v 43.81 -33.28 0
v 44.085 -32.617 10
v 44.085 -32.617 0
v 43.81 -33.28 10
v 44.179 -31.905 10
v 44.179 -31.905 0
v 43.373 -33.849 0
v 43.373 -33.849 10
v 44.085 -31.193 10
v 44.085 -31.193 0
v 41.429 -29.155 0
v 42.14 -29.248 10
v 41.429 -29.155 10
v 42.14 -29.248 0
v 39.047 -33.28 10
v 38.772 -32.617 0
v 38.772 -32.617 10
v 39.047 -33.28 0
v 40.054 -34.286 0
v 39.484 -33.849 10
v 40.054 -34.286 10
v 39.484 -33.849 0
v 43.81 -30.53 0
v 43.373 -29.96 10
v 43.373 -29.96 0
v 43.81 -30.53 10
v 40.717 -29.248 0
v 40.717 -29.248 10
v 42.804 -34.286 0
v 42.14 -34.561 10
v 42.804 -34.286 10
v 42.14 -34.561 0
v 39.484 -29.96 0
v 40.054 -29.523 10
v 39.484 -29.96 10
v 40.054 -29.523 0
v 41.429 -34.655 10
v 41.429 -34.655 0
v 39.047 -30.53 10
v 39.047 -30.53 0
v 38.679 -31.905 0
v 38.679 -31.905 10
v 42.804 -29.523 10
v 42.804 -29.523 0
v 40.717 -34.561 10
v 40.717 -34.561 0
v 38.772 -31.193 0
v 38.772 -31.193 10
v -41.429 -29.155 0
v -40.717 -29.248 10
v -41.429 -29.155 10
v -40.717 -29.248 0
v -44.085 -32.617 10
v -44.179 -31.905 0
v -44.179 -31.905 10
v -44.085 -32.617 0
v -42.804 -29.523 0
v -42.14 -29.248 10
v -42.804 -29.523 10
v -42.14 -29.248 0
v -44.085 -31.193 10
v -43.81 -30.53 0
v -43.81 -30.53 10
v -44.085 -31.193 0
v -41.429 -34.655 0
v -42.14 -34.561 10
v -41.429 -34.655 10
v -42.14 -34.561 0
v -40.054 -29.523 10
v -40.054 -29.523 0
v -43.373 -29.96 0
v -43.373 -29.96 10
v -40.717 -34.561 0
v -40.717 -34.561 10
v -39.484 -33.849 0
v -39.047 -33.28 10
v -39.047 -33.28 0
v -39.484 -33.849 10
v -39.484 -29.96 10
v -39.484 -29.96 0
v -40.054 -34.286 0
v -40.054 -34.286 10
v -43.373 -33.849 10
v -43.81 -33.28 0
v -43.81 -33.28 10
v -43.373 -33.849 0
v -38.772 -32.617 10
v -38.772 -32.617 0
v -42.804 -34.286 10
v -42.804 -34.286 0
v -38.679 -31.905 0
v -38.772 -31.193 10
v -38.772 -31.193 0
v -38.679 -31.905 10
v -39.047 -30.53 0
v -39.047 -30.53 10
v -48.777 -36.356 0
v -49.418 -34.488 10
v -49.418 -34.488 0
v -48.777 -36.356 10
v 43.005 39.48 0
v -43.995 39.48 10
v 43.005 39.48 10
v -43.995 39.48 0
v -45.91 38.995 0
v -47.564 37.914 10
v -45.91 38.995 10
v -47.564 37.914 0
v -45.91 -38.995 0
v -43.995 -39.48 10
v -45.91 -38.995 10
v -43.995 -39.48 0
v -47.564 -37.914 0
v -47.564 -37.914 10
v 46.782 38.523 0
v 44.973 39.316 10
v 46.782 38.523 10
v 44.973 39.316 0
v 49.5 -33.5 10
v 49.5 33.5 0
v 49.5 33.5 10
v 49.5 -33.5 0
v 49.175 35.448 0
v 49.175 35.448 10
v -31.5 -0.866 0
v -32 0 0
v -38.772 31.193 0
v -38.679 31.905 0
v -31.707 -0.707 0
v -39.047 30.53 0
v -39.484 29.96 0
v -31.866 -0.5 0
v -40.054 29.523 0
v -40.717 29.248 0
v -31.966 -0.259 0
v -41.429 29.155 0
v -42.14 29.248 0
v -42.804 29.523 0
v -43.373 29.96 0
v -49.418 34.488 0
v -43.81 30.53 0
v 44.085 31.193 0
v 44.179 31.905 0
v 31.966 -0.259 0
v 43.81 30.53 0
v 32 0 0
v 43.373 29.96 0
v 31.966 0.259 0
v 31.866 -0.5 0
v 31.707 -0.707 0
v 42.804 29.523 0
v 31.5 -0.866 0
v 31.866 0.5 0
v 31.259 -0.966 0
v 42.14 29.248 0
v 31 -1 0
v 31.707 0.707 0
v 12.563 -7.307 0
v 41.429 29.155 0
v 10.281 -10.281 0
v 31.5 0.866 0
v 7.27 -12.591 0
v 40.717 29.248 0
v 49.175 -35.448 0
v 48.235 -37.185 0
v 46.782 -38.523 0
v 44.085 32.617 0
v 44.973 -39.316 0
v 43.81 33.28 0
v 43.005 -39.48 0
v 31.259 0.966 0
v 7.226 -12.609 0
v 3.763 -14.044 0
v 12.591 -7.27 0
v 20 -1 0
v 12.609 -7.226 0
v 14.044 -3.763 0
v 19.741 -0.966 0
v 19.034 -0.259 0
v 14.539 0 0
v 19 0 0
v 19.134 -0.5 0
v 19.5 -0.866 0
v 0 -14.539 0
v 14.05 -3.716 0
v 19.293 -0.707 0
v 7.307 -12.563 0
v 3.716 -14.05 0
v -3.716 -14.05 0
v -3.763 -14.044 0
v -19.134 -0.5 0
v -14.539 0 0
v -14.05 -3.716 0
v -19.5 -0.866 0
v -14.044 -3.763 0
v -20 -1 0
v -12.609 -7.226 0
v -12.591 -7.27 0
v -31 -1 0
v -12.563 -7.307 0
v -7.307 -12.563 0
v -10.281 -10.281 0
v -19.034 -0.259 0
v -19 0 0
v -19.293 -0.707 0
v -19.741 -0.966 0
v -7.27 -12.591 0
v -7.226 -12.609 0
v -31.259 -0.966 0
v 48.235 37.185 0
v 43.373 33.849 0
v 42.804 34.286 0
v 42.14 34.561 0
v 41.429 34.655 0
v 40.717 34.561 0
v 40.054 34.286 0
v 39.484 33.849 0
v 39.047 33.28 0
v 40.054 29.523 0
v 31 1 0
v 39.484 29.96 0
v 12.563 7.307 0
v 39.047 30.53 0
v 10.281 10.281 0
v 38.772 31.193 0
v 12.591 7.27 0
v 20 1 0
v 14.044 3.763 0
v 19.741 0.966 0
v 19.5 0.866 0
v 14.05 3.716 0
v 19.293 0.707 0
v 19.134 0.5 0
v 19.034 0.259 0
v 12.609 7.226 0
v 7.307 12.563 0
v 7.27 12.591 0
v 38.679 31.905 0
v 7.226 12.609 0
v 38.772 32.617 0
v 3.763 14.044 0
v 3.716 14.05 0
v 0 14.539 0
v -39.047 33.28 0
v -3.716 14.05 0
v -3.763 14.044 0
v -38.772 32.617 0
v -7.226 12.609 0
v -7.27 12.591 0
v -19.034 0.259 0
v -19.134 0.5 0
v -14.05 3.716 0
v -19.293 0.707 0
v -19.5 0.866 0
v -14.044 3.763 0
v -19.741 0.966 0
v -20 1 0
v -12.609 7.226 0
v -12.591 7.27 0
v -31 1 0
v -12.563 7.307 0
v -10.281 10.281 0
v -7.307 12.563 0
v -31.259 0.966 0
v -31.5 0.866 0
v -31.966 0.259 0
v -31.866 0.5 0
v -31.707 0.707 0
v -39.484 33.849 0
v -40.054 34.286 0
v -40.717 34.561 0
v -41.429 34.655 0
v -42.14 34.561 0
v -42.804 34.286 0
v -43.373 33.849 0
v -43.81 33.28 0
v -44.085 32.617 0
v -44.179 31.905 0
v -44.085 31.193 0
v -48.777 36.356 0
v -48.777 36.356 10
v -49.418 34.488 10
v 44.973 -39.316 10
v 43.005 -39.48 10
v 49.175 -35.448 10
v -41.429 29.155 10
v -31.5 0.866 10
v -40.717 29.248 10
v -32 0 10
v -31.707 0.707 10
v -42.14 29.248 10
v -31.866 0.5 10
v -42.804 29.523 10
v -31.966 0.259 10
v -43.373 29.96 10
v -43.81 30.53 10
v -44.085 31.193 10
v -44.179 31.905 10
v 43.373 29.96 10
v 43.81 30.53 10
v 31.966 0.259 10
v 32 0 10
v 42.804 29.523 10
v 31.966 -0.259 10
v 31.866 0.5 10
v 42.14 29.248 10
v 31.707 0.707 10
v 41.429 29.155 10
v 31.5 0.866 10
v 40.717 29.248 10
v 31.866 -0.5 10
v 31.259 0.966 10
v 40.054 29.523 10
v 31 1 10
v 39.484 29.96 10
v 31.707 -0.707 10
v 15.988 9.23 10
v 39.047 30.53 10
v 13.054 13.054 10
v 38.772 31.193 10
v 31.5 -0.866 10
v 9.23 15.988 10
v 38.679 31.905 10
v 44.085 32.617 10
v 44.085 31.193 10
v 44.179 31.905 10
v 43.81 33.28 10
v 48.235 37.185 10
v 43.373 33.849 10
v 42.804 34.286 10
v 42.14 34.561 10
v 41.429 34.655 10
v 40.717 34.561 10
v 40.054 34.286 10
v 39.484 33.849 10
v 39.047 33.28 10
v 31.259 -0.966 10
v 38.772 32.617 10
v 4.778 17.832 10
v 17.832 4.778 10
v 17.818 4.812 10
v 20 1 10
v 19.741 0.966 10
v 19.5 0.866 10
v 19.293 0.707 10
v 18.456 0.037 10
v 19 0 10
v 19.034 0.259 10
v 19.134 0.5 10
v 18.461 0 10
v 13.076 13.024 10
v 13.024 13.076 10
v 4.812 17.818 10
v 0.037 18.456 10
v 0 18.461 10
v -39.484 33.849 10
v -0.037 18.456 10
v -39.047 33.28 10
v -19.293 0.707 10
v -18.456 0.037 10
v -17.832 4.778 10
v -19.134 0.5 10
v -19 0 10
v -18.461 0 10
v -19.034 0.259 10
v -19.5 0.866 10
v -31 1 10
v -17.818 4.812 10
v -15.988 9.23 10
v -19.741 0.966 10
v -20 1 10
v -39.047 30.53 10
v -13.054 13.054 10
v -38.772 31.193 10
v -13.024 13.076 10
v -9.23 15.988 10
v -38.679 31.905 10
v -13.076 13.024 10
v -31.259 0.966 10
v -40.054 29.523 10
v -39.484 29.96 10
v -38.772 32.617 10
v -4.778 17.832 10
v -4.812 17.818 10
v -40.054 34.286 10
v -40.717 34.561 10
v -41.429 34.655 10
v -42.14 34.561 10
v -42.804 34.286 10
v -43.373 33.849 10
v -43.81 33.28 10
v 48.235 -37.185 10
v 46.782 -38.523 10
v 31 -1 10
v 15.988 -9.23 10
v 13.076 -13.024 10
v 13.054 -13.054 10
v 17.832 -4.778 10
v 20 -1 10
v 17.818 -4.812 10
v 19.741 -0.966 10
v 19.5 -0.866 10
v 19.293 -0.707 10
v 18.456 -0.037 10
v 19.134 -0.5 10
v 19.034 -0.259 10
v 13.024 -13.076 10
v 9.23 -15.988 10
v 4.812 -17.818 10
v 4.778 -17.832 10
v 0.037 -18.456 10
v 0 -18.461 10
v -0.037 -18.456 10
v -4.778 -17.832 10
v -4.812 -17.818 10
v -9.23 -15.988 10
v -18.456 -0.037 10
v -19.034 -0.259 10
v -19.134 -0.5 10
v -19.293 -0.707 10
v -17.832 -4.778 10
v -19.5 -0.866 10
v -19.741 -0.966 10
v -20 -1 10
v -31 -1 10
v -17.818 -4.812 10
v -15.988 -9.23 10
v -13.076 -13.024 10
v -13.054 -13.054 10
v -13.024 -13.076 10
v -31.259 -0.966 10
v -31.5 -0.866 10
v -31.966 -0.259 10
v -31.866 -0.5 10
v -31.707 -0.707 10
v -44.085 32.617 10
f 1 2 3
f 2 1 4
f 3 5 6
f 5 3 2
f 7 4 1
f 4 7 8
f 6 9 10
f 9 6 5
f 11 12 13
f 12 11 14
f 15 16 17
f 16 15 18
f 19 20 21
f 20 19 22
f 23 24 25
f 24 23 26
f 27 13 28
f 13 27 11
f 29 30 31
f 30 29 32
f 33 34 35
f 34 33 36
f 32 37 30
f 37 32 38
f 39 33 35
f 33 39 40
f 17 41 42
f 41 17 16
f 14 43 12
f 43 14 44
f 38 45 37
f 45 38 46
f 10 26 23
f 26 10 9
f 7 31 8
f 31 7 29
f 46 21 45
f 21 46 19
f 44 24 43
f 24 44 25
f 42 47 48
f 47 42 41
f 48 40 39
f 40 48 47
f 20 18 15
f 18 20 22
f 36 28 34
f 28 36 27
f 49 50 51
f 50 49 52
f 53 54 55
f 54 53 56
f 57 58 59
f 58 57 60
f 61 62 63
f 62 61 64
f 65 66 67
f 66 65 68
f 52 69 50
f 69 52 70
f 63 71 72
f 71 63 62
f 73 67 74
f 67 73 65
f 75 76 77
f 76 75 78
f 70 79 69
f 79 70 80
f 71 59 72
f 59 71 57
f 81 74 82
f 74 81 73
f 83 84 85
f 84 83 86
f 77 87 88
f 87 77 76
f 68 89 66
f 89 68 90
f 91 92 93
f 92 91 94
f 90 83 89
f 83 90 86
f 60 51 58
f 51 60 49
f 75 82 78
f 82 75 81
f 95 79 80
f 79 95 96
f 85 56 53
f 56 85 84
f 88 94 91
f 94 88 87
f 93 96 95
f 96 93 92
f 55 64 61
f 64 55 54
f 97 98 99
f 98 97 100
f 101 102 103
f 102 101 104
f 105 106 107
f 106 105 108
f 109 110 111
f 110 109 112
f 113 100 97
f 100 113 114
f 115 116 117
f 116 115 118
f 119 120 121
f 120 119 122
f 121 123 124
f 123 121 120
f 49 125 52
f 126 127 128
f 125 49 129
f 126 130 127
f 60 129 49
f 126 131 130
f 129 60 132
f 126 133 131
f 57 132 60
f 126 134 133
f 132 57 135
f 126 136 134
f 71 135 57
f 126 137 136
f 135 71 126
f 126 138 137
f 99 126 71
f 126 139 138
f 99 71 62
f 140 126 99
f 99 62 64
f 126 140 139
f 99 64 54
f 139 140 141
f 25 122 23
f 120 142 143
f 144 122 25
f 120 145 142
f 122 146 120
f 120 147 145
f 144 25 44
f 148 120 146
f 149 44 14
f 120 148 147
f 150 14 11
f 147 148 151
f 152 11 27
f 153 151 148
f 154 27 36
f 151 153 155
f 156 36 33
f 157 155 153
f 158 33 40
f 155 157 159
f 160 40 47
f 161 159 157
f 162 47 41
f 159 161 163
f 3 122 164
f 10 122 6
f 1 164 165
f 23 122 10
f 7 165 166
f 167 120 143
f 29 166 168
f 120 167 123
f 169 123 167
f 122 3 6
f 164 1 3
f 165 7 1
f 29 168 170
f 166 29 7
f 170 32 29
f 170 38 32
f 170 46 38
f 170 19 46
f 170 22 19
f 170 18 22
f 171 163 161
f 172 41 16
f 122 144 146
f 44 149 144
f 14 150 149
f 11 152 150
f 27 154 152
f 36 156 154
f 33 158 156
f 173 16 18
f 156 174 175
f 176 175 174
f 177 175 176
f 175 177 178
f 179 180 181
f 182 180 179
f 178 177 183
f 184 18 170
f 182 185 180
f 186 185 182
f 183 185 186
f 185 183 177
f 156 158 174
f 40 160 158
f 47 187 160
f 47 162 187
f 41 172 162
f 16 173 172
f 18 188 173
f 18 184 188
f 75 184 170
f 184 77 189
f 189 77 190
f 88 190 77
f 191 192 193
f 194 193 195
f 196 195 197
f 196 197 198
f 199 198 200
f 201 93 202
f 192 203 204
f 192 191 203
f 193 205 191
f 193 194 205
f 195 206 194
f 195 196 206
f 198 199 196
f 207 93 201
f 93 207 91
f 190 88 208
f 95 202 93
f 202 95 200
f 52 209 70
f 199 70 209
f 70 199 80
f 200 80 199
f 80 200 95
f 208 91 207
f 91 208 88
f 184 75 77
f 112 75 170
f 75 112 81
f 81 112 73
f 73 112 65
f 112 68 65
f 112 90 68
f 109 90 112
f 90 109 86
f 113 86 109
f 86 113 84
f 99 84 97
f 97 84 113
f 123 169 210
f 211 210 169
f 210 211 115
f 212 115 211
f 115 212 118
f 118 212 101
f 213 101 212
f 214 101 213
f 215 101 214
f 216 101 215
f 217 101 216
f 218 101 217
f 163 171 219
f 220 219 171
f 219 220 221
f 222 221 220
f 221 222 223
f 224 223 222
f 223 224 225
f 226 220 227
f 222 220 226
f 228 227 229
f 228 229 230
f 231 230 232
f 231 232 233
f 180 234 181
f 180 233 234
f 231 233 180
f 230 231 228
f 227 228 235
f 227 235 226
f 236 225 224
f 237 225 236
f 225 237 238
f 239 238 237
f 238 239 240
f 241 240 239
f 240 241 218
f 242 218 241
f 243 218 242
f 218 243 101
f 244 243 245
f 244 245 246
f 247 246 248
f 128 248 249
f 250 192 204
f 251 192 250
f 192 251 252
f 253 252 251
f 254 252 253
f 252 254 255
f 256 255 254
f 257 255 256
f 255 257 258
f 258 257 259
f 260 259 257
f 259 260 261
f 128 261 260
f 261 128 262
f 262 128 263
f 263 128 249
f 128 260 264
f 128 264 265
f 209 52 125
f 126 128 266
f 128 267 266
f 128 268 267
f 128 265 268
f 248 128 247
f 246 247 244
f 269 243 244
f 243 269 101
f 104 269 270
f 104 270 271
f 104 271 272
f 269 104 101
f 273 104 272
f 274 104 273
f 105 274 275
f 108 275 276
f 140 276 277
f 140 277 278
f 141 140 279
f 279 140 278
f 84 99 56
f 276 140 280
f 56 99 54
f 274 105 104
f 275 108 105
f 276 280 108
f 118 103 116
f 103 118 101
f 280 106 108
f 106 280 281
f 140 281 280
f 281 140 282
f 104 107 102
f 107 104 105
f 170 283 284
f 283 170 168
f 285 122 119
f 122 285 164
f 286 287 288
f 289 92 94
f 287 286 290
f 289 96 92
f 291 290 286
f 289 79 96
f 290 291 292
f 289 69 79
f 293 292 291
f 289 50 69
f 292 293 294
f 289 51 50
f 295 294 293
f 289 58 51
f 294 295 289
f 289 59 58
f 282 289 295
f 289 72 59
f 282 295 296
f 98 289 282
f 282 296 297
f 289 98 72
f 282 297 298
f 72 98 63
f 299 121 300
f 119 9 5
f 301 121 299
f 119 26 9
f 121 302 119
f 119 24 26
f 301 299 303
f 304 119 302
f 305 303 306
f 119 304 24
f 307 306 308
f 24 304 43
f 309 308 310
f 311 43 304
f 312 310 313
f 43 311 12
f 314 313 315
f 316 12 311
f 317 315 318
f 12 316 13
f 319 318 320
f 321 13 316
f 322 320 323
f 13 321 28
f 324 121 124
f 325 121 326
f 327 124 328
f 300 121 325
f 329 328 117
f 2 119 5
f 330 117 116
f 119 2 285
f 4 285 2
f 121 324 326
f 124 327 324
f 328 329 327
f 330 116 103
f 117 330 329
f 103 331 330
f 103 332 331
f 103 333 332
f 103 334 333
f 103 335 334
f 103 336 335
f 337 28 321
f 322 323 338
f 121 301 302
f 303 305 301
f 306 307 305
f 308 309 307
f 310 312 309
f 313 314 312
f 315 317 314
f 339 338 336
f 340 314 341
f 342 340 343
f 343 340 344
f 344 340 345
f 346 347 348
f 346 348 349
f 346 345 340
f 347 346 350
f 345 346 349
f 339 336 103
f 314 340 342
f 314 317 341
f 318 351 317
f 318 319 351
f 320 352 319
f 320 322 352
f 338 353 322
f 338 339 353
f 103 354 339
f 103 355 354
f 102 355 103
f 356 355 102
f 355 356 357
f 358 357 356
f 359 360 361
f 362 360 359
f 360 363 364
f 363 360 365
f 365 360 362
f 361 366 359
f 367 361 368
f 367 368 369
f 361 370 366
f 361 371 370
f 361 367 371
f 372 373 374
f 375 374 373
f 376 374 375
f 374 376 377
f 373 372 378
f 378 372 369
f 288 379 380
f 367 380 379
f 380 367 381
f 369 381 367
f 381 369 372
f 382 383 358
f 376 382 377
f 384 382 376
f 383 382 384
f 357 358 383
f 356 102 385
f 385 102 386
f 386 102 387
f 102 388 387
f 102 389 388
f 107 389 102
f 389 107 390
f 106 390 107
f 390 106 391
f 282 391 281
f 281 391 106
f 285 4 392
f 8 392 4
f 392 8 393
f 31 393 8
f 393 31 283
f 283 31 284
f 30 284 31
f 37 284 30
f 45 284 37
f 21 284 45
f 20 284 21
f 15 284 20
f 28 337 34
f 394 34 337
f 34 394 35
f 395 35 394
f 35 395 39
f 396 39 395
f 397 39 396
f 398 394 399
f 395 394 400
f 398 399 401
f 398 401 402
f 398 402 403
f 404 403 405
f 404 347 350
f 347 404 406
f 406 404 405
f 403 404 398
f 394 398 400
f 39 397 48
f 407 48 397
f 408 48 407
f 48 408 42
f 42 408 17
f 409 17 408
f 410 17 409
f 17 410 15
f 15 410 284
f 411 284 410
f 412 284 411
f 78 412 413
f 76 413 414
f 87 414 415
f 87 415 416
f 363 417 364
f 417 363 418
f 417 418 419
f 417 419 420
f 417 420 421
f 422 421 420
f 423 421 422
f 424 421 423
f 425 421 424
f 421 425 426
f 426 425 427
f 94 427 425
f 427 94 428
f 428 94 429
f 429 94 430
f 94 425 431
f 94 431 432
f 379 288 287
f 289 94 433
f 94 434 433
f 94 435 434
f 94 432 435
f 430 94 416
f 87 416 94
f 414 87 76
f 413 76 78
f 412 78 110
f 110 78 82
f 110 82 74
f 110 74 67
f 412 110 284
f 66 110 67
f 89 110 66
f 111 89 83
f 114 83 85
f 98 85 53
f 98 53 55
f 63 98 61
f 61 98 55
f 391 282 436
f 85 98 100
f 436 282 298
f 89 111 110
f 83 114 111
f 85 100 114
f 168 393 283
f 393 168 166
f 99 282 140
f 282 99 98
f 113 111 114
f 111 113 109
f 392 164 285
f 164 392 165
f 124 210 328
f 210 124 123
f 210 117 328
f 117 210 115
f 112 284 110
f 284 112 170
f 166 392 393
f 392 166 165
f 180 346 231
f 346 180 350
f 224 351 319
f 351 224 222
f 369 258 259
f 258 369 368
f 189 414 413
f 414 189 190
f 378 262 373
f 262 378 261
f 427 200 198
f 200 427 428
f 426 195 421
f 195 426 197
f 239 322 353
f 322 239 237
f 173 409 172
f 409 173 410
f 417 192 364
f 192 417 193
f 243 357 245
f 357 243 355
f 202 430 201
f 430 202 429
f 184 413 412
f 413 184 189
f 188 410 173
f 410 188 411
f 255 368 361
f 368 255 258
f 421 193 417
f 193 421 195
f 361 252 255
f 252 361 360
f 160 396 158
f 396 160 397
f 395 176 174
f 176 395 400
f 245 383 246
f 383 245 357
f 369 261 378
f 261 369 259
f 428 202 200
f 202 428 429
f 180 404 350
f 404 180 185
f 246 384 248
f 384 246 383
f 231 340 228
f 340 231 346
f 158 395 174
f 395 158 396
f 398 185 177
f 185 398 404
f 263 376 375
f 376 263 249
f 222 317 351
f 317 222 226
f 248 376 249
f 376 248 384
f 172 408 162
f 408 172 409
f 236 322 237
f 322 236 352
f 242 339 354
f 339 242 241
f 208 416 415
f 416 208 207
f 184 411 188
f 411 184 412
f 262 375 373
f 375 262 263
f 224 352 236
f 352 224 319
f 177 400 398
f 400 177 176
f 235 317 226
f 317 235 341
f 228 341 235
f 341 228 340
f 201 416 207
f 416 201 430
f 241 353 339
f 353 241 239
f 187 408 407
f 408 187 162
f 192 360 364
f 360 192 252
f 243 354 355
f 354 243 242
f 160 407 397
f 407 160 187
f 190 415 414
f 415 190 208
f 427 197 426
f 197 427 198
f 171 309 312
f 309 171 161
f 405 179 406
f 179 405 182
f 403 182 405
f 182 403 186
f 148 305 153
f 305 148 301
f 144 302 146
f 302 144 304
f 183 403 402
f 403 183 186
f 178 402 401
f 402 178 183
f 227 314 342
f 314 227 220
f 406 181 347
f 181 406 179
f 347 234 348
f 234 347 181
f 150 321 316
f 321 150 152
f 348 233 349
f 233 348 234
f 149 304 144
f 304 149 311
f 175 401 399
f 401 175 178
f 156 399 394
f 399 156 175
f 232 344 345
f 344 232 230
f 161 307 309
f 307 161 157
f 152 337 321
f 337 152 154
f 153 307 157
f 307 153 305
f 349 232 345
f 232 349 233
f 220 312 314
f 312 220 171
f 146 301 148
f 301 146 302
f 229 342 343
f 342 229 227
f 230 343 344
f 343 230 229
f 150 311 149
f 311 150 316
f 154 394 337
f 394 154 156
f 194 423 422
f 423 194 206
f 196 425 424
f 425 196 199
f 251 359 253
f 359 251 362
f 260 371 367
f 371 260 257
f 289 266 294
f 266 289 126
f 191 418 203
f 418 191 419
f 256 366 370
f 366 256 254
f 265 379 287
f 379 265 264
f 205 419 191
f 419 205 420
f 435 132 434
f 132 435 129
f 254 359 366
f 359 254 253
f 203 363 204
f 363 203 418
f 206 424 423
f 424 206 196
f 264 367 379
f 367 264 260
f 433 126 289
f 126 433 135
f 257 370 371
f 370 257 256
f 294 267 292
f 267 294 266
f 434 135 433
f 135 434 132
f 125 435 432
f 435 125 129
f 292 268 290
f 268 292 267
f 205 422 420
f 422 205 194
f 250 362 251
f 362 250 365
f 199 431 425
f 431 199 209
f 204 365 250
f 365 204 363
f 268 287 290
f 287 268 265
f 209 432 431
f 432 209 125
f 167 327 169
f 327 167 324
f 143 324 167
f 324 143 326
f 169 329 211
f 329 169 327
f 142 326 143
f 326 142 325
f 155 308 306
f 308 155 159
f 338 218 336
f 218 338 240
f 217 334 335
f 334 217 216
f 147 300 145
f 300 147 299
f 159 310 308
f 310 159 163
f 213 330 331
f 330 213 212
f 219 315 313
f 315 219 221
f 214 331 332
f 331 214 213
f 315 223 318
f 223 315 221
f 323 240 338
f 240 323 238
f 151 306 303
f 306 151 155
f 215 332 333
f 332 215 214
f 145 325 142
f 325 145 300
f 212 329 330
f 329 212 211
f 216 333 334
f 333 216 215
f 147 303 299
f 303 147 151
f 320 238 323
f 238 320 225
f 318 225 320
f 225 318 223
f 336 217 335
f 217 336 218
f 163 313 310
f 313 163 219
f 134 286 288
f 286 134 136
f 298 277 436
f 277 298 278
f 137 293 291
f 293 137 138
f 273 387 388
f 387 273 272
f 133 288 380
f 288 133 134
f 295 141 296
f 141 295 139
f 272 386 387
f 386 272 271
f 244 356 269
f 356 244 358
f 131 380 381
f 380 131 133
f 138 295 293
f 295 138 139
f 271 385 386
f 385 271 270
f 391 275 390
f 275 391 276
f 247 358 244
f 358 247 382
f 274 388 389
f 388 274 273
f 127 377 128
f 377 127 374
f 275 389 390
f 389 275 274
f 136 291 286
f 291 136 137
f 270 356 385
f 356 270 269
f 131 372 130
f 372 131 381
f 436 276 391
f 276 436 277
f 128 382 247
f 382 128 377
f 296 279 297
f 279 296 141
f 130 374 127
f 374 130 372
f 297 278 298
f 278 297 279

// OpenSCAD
// Sillcock Mount and Repair Frame --  Version 1.0
// (C) 2016 by Matthew Nielsen
// Home page: https://github.com/xunker/sillcock_mount_repair
// License: "Creative Commons -- Attribution -- Non-Commercial -- Share Alike"

// Thickness of the spacer. The default of 10mm is about 3/8th inch.
thickness = 10.0;

// Diameter of the main pipe opening. NOTE: since this spacer slides length-wise down the pipe, this opening must be big enough to pass anything else on the pipe like the integrated nut. The default of 29mm gives clearance for a 26mm pipe, the integrated nut.
pipe_diameter = 29.0;

// Many sillcocks have welds around the flange. Set a opening taper to make the pipe opening be a cone so the spacer can go around the welds and set flush with the flange. If
opening_taper_diameter = 37.0;

// Diameter of the mounting screw holes around the corners
mount_screw_hole_diameter = 5.5;

// Postion of the mounting screw holes in the corner as a ratio of the width and height. Larger numbers will place them closer to the center.
mount_screw_position_ratio = 2.1;

// Diameter of the screw channels on either side of the opening. This is where the sillcock will attach to the frame and so it should be kept small to give your screws more "bite".
screw_channel_diameter = 2.0;

// The beginning offset of the screw channel *from the center of the object*.
screw_x_offset = 20.0;

// To create an elongated screw screw channel (recommended), use this to specify how wide it will be.
screw_x_width = 11.0;

// Length of the spacer. You should not need to change this.
length = 67.0;

// Width of the spacer. You should not need to change this.
width = 87.0;

// Rounder corner radius. This will be added to the width and height of the plate.
rounded_corner_radius = 6;

// Facets: Increasing this will make for smoother circles but will also increase the rendering time. You should not need to change this.
facets = 24;

module screw_channel() {
  hull() {
    translate([screw_x_offset, 0, -0.1]) cylinder(d=screw_channel_diameter, h=thickness+0.2, $fn=facets);
    translate([screw_x_offset+screw_x_width, 0, -0.1]) cylinder(d=screw_channel_diameter, h=thickness+0.2, $fn=facets);
  }
}

module mounting_hole() {
  translate([width/mount_screw_position_ratio,length/mount_screw_position_ratio,-0.1]) cylinder(d=mount_screw_hole_diameter, h=thickness+0.2, $fn=facets);
}

difference() {
  // create rounded edges
  hull() {
    translate([-width/2, -length/2, 0]) cube([width, length, thickness]);
    translate([-width/2, -length/2, 0]) cylinder(r=rounded_corner_radius, h=thickness);
    translate([width/2, -length/2, 0]) cylinder(r=rounded_corner_radius, h=thickness);
    translate([-width/2, length/2, 0]) cylinder(r=rounded_corner_radius, h=thickness);
    translate([width/2, length/2, 0]) cylinder(r=rounded_corner_radius, h=thickness);
  }

  translate([0,0,-0.1]) cylinder(d1=pipe_diameter, d2=opening_taper_diameter, h=thickness+0.2, $fn=facets);
  screw_channel();
  mirror([1,0,0]) screw_channel();

  mounting_hole();
  mirror([1,0,0]) mounting_hole();

  mirror([0,1,0]) {
    mounting_hole();
    mirror([1,0,0]) mounting_hole();
  }
}
